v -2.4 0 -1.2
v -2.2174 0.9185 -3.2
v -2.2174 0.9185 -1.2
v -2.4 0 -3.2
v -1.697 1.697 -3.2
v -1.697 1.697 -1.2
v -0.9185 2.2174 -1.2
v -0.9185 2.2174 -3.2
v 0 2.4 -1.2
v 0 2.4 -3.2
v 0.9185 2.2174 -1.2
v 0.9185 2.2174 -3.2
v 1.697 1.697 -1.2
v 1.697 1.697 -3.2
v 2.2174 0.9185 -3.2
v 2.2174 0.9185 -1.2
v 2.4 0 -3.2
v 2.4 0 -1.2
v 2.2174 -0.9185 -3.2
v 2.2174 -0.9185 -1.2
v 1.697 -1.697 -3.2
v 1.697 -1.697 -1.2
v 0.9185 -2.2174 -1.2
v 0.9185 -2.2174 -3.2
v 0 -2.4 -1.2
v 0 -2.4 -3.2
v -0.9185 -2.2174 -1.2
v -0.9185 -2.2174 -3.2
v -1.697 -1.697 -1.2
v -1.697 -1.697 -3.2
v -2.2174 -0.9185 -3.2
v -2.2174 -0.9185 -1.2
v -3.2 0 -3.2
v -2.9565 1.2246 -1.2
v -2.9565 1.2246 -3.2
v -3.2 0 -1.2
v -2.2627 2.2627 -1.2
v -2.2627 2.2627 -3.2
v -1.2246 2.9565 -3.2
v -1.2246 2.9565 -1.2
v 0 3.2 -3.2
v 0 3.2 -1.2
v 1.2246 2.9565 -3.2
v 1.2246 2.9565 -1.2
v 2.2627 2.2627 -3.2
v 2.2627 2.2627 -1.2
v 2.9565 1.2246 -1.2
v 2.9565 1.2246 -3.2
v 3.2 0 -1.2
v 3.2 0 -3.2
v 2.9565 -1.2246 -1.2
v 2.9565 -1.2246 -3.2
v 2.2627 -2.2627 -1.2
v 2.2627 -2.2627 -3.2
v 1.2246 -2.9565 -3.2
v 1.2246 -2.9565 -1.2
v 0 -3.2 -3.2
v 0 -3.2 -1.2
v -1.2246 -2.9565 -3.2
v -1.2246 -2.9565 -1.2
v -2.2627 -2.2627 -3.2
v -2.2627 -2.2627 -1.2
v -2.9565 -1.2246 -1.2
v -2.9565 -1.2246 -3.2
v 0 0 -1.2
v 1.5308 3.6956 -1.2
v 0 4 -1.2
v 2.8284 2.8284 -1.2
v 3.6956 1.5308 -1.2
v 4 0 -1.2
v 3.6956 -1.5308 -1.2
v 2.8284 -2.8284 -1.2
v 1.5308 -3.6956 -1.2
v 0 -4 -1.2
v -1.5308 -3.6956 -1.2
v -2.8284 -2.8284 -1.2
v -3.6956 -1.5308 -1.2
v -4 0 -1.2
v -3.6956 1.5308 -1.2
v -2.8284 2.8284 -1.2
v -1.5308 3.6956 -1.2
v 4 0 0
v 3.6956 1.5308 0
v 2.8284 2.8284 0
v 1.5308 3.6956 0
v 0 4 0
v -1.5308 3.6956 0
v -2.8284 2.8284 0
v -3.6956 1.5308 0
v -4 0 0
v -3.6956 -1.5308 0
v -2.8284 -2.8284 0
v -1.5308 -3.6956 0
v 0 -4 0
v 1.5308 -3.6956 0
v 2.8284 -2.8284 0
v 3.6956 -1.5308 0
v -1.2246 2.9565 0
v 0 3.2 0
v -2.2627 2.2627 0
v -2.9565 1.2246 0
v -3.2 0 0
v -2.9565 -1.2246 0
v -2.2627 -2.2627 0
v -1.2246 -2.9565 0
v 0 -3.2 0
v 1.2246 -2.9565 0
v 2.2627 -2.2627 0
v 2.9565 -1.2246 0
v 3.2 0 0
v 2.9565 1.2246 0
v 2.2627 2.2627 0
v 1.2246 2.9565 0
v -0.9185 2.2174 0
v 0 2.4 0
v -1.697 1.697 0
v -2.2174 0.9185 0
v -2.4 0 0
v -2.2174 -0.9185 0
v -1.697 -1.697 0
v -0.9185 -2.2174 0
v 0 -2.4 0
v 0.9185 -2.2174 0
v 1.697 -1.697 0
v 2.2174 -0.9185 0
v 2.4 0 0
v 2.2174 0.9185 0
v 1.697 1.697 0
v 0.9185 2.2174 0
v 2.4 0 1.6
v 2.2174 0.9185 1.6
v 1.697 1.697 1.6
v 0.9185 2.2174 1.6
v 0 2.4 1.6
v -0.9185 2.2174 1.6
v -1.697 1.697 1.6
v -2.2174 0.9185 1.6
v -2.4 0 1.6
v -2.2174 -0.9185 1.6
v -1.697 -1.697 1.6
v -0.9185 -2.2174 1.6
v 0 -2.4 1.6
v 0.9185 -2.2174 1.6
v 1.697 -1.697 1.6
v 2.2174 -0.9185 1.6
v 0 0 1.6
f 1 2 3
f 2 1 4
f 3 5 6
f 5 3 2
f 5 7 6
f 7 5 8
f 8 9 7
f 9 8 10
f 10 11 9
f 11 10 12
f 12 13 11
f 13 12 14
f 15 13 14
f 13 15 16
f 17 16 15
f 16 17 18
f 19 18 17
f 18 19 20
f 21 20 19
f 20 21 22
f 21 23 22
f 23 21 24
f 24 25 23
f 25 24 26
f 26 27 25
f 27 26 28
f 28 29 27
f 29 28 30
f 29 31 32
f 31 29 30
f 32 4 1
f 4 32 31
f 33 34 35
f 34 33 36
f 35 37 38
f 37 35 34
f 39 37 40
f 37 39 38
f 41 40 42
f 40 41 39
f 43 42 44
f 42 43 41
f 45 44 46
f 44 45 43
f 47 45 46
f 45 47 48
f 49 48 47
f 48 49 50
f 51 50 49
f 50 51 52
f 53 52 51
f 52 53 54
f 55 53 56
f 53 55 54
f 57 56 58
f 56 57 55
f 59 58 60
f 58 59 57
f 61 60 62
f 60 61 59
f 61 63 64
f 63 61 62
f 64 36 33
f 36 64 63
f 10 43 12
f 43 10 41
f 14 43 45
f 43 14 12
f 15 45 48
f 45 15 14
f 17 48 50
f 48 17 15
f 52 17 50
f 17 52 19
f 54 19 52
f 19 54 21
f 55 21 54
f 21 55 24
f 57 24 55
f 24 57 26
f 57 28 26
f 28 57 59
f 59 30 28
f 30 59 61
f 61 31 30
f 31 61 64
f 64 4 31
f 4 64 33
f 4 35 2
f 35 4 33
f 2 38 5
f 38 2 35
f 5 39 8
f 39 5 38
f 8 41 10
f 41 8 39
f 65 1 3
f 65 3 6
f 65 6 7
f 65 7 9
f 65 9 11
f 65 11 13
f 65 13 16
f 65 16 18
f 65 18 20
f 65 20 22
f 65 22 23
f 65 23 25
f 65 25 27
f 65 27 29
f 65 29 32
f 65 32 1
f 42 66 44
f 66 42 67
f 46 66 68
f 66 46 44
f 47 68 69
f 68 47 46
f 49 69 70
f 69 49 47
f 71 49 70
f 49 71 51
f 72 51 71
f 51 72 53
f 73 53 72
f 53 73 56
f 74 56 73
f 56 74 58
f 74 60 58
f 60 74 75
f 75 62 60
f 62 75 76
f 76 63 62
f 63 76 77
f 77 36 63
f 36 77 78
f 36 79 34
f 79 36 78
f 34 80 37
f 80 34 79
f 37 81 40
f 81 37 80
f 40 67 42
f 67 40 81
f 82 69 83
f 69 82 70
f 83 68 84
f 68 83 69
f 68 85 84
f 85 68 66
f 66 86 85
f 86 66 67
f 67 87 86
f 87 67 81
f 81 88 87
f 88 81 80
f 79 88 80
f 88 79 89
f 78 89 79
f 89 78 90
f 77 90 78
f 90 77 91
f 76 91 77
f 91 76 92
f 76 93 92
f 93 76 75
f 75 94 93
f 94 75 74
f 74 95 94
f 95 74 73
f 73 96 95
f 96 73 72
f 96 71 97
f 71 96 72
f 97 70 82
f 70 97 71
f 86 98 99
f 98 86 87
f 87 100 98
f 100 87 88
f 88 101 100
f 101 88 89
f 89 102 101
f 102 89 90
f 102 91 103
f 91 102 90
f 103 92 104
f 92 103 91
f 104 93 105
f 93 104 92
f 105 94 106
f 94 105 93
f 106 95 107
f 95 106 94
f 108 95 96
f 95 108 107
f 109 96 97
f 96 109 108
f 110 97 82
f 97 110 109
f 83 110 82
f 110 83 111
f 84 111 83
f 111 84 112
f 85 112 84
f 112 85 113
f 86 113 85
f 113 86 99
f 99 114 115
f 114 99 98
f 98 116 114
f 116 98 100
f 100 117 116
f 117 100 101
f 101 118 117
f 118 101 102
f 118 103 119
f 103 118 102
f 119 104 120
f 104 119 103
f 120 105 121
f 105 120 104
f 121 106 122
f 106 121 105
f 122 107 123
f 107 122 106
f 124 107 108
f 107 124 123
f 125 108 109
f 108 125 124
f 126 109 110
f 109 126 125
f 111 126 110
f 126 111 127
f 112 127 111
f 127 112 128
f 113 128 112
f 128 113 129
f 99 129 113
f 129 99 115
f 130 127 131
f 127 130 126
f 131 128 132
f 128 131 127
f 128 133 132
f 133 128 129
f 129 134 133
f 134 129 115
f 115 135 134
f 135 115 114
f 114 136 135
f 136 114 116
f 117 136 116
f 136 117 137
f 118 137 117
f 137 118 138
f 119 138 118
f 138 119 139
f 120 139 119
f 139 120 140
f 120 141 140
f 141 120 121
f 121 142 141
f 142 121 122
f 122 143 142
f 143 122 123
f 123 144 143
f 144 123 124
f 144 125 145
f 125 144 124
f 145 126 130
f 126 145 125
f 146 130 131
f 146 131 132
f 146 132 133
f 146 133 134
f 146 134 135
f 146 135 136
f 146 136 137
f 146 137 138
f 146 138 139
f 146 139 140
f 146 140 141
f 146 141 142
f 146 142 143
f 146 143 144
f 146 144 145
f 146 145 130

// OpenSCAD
// file: ../p/4-4edge.scad
use <../lib.scad>
function ldraw_lib__4_4edge() = [
// 0 Circle 1.0
// 0 Name: 4-4edge.dat
// 0 Author: James Jessiman
// 0 !LDRAW_ORG Primitive UPDATE 2017-01
// 0 !LICENSE Licensed under CC BY 2.0 and CC BY 4.0 : see CAreadme.txt
// 
// 0 BFC CERTIFY CCW
  [0,"BFC","CERTIFY"],
  [0,"BFC","CCW"],
// 
// 0 !HISTORY 1998-12-15 [PTadmin] Official Update 1998-10
// 0 !HISTORY 2005-12-28 [PTadmin] Official Update 2005-01
// 0 !HISTORY 2007-06-24 [PTadmin] Header formatted for Contributor Agreement
// 0 !HISTORY 2008-07-01 [PTadmin] Official Update 2008-01
// 0 !HISTORY 2017-01-15 [Steffen] BFCed
// 0 !HISTORY 2017-12-30 [PTadmin] Official Update 2017-01
// 
// 
// 2 24 1 0 0 0.9239 0 0.3827
  [2,24,1,0,0,0.9239,0,0.3827],
// 2 24 0.9239 0 0.3827 0.7071 0 0.7071
  [2,24,0.9239,0,0.3827,0.7071,0,0.7071],
// 2 24 0.7071 0 0.7071 0.3827 0 0.9239
  [2,24,0.7071,0,0.7071,0.3827,0,0.9239],
// 2 24 0.3827 0 0.9239 0 0 1
  [2,24,0.3827,0,0.9239,0,0,1],
// 2 24 0 0 1 -0.3827 0 0.9239
  [2,24,0,0,1,-0.3827,0,0.9239],
// 2 24 -0.3827 0 0.9239 -0.7071 0 0.7071
  [2,24,-0.3827,0,0.9239,-0.7071,0,0.7071],
// 2 24 -0.7071 0 0.7071 -0.9239 0 0.3827
  [2,24,-0.7071,0,0.7071,-0.9239,0,0.3827],
// 2 24 -0.9239 0 0.3827 -1 0 -0
  [2,24,-0.9239,0,0.3827,-1,0,-0],
// 2 24 -1 0 -0 -0.9239 0 -0.3827
  [2,24,-1,0,-0,-0.9239,0,-0.3827],
// 2 24 -0.9239 0 -0.3827 -0.7071 0 -0.7071
  [2,24,-0.9239,0,-0.3827,-0.7071,0,-0.7071],
// 2 24 -0.7071 0 -0.7071 -0.3827 0 -0.9239
  [2,24,-0.7071,0,-0.7071,-0.3827,0,-0.9239],
// 2 24 -0.3827 0 -0.9239 0 0 -1
  [2,24,-0.3827,0,-0.9239,0,0,-1],
// 2 24 0 0 -1 0.3827 0 -0.9239
  [2,24,0,0,-1,0.3827,0,-0.9239],
// 2 24 0.3827 0 -0.9239 0.7071 0 -0.7071
  [2,24,0.3827,0,-0.9239,0.7071,0,-0.7071],
// 2 24 0.7071 0 -0.7071 0.9239 0 -0.3827
  [2,24,0.7071,0,-0.7071,0.9239,0,-0.3827],
// 2 24 0.9239 0 -0.3827 1 0 0
  [2,24,0.9239,0,-0.3827,1,0,0],
];
module ldraw_lib__4_4edge(step=0, col=false, unit=2/5, alt=false, line=0.2, solid=!$preview)
    makepoly(ldraw_lib__4_4edge(), step=step, col=col, unit=unit, alt=alt, line=line, solid=solid);
ldraw_lib__4_4edge(line=0.2);
// file: ../p/4-4cyli.scad
use <../lib.scad>
function ldraw_lib__4_4cyli() = [
// 0 Cylinder 1.0
// 0 Name: 4-4cyli.dat
// 0 Author: James Jessiman
// 0 !LDRAW_ORG Primitive UPDATE 2005-01
// 0 !LICENSE Licensed under CC BY 2.0 and CC BY 4.0 : see CAreadme.txt
// 
// 0 BFC CERTIFY CCW
  [0,"BFC","CERTIFY"],
  [0,"BFC","CCW"],
// 
// 0 !HISTORY 1998-12-15 [PTadmin] Official Update 1998-10
// 0 !HISTORY 2002-03-23 [sbliss] Added BFC statement; merged headers from files in distributions LDraw 0.27 and Complete.
// 0 !HISTORY 2002-04-25 [PTadmin] Official Update 2002-02
// 0 !HISTORY 2004-12-14 [guyvivan] BFC CCW
// 0 !HISTORY 2005-12-28 [PTadmin] Official Update 2005-01
// 0 !HISTORY 2007-06-24 [PTadmin] Header formatted for Contributor Agreement
// 0 !HISTORY 2008-07-01 [PTadmin] Official Update 2008-01
// 
// 
// 4 16 1 1 0 0.9239 1 0.3827 0.9239 0 0.3827 1 0 0
  [4,16,1,1,0,0.9239,1,0.3827,0.9239,0,0.3827,1,0,0],
// 5 24 1 0 0 1 1 0 0.9239 0 0.3827 0.9239 0 -0.3827
  [5,24,1,0,0,1,1,0,0.9239,0,0.3827,0.9239,0,-0.3827],
// 4 16 0.9239 1 0.3827 0.7071 1 0.7071 0.7071 0 0.7071 0.9239 0 0.3827
  [4,16,0.9239,1,0.3827,0.7071,1,0.7071,0.7071,0,0.7071,0.9239,0,0.3827],
// 5 24 0.9239 0 0.3827 0.9239 1 0.3827 0.7071 0 0.7071 1 0 0
  [5,24,0.9239,0,0.3827,0.9239,1,0.3827,0.7071,0,0.7071,1,0,0],
// 4 16 0.7071 1 0.7071 0.3827 1 0.9239 0.3827 0 0.9239 0.7071 0 0.7071
  [4,16,0.7071,1,0.7071,0.3827,1,0.9239,0.3827,0,0.9239,0.7071,0,0.7071],
// 5 24 0.7071 0 0.7071 0.7071 1 0.7071 0.3827 0 0.9239 0.9239 0 0.3827
  [5,24,0.7071,0,0.7071,0.7071,1,0.7071,0.3827,0,0.9239,0.9239,0,0.3827],
// 4 16 0.3827 1 0.9239 0 1 1 0 0 1 0.3827 0 0.9239
  [4,16,0.3827,1,0.9239,0,1,1,0,0,1,0.3827,0,0.9239],
// 5 24 0.3827 0 0.9239 0.3827 1 0.9239 0 0 1 0.7071 0 0.7071
  [5,24,0.3827,0,0.9239,0.3827,1,0.9239,0,0,1,0.7071,0,0.7071],
// 4 16 0 1 1 -0.3827 1 0.9239 -0.3827 0 0.9239 0 0 1
  [4,16,0,1,1,-0.3827,1,0.9239,-0.3827,0,0.9239,0,0,1],
// 5 24 0 0 1 0 1 1 -0.3827 0 0.9239 0.3827 0 0.9239
  [5,24,0,0,1,0,1,1,-0.3827,0,0.9239,0.3827,0,0.9239],
// 4 16 -0.3827 1 0.9239 -0.7071 1 0.7071 -0.7071 0 0.7071 -0.3827 0 0.9239
  [4,16,-0.3827,1,0.9239,-0.7071,1,0.7071,-0.7071,0,0.7071,-0.3827,0,0.9239],
// 5 24 -0.3827 0 0.9239 -0.3827 1 0.9239 -0.7071 0 0.7071 0 0 1
  [5,24,-0.3827,0,0.9239,-0.3827,1,0.9239,-0.7071,0,0.7071,0,0,1],
// 4 16 -0.7071 1 0.7071 -0.9239 1 0.3827 -0.9239 0 0.3827 -0.7071 0 0.7071
  [4,16,-0.7071,1,0.7071,-0.9239,1,0.3827,-0.9239,0,0.3827,-0.7071,0,0.7071],
// 5 24 -0.7071 0 0.7071 -0.7071 1 0.7071 -0.9239 0 0.3827 -0.3827 0 0.9239
  [5,24,-0.7071,0,0.7071,-0.7071,1,0.7071,-0.9239,0,0.3827,-0.3827,0,0.9239],
// 4 16 -0.9239 1 0.3827 -1 1 0 -1 0 0 -0.9239 0 0.3827
  [4,16,-0.9239,1,0.3827,-1,1,0,-1,0,0,-0.9239,0,0.3827],
// 5 24 -0.9239 0 0.3827 -0.9239 1 0.3827 -1 0 0 -0.7071 0 0.7071
  [5,24,-0.9239,0,0.3827,-0.9239,1,0.3827,-1,0,0,-0.7071,0,0.7071],
// 4 16 -1 1 0 -0.9239 1 -0.3827 -0.9239 0 -0.3827 -1 0 0
  [4,16,-1,1,0,-0.9239,1,-0.3827,-0.9239,0,-0.3827,-1,0,0],
// 5 24 -1 0 0 -1 1 0 -0.9239 0 -0.3827 -0.9239 0 0.3827
  [5,24,-1,0,0,-1,1,0,-0.9239,0,-0.3827,-0.9239,0,0.3827],
// 4 16 -0.9239 1 -0.3827 -0.7071 1 -0.7071 -0.7071 0 -0.7071 -0.9239 0 -0.3827
  [4,16,-0.9239,1,-0.3827,-0.7071,1,-0.7071,-0.7071,0,-0.7071,-0.9239,0,-0.3827],
// 5 24 -0.9239 0 -0.3827 -0.9239 1 -0.3827 -0.7071 0 -0.7071 -1 0 0
  [5,24,-0.9239,0,-0.3827,-0.9239,1,-0.3827,-0.7071,0,-0.7071,-1,0,0],
// 4 16 -0.7071 1 -0.7071 -0.3827 1 -0.9239 -0.3827 0 -0.9239 -0.7071 0 -0.7071
  [4,16,-0.7071,1,-0.7071,-0.3827,1,-0.9239,-0.3827,0,-0.9239,-0.7071,0,-0.7071],
// 5 24 -0.7071 0 -0.7071 -0.7071 1 -0.7071 -0.3827 0 -0.9239 -0.9239 0 -0.3827
  [5,24,-0.7071,0,-0.7071,-0.7071,1,-0.7071,-0.3827,0,-0.9239,-0.9239,0,-0.3827],
// 4 16 -0.3827 1 -0.9239 0 1 -1 0 0 -1 -0.3827 0 -0.9239
  [4,16,-0.3827,1,-0.9239,0,1,-1,0,0,-1,-0.3827,0,-0.9239],
// 5 24 -0.3827 0 -0.9239 -0.3827 1 -0.9239 0 0 -1 -0.7071 0 -0.7071
  [5,24,-0.3827,0,-0.9239,-0.3827,1,-0.9239,0,0,-1,-0.7071,0,-0.7071],
// 4 16 0 1 -1 0.3827 1 -0.9239 0.3827 0 -0.9239 0 0 -1
  [4,16,0,1,-1,0.3827,1,-0.9239,0.3827,0,-0.9239,0,0,-1],
// 5 24 0 0 -1 0 1 -1 0.3827 0 -0.9239 -0.3827 0 -0.9239
  [5,24,0,0,-1,0,1,-1,0.3827,0,-0.9239,-0.3827,0,-0.9239],
// 4 16 0.3827 1 -0.9239 0.7071 1 -0.7071 0.7071 0 -0.7071 0.3827 0 -0.9239
  [4,16,0.3827,1,-0.9239,0.7071,1,-0.7071,0.7071,0,-0.7071,0.3827,0,-0.9239],
// 5 24 0.3827 0 -0.9239 0.3827 1 -0.9239 0.7071 0 -0.7071 0 0 -1
  [5,24,0.3827,0,-0.9239,0.3827,1,-0.9239,0.7071,0,-0.7071,0,0,-1],
// 4 16 0.7071 1 -0.7071 0.9239 1 -0.3827 0.9239 0 -0.3827 0.7071 0 -0.7071
  [4,16,0.7071,1,-0.7071,0.9239,1,-0.3827,0.9239,0,-0.3827,0.7071,0,-0.7071],
// 5 24 0.7071 0 -0.7071 0.7071 1 -0.7071 0.9239 0 -0.3827 0.3827 0 -0.9239
  [5,24,0.7071,0,-0.7071,0.7071,1,-0.7071,0.9239,0,-0.3827,0.3827,0,-0.9239],
// 4 16 0.9239 1 -0.3827 1 1 0 1 0 0 0.9239 0 -0.3827
  [4,16,0.9239,1,-0.3827,1,1,0,1,0,0,0.9239,0,-0.3827],
// 5 24 0.9239 0 -0.3827 0.9239 1 -0.3827 1 0 0 0.7071 0 -0.7071
  [5,24,0.9239,0,-0.3827,0.9239,1,-0.3827,1,0,0,0.7071,0,-0.7071],
// 0
];
module ldraw_lib__4_4cyli(step=0, col=false, unit=2/5, alt=false, line=0.2, solid=!$preview)
    makepoly(ldraw_lib__4_4cyli(), step=step, col=col, unit=unit, alt=alt, line=line, solid=solid);
ldraw_lib__4_4cyli(line=0.2);
// file: ../p/stud4.scad
use <../lib.scad>
use <4-4cyli.scad>
use <4-4edge.scad>
use <4-4ring3.scad>
function ldraw_lib__stud4() = [
// 0 Stud Tube Open
// 0 Name: stud4.dat
// 0 Author: James Jessiman
// 0 !LDRAW_ORG Primitive UPDATE 2009-02
// 0 !LICENSE Licensed under CC BY 2.0 and CC BY 4.0 : see CAreadme.txt
// 
// 0 BFC CERTIFY CCW
  [0,"BFC","CERTIFY"],
  [0,"BFC","CCW"],
// 
// 0 !HISTORY 1999-07-05 [PTadmin] Official Update 1999-05
// 0 !HISTORY 2002-04-04 [sbliss] Modified for BFC compliance
// 0 !HISTORY 2002-04-25 [PTadmin] Official Update 2002-02
// 0 !HISTORY 2007-06-24 [PTadmin] Header formatted for Contributor Agreement
// 0 !HISTORY 2008-07-01 [PTadmin] Official Update 2008-01
// 0 !HISTORY 2009-06-21 [cwdee] Update ring references to 4-4ring
// 0 !HISTORY 2009-09-03 [PTadmin] Official Update 2009-02
// 
// 
// 1 16 0 -4 0 6 0 0 0 1 0 0 0 6 4-4edge.dat
  [1,16,0,-4,0,6,0,0,0,1,0,0,0,6, ldraw_lib__4_4edge()],
// 1 16 0 -4 0 8 0 0 0 1 0 0 0 8 4-4edge.dat
  [1,16,0,-4,0,8,0,0,0,1,0,0,0,8, ldraw_lib__4_4edge()],
// 1 16 0 0 0 6 0 0 0 1 0 0 0 6 4-4edge.dat
  [1,16,0,0,0,6,0,0,0,1,0,0,0,6, ldraw_lib__4_4edge()],
// 1 16 0 0 0 8 0 0 0 1 0 0 0 8 4-4edge.dat
  [1,16,0,0,0,8,0,0,0,1,0,0,0,8, ldraw_lib__4_4edge()],
// 0 BFC INVERTNEXT
  [0,"BFC","INVERTNEXT"],
// 1 16 0 -4 0 6 0 0 0 4 0 0 0 6 4-4cyli.dat
  [1,16,0,-4,0,6,0,0,0,4,0,0,0,6, ldraw_lib__4_4cyli()],
// 1 16 0 -4 0 8 0 0 0 4 0 0 0 8 4-4cyli.dat
  [1,16,0,-4,0,8,0,0,0,4,0,0,0,8, ldraw_lib__4_4cyli()],
// 1 16 0 -4 0 2 0 0 0 1 0 0 0 2 4-4ring3.dat
  [1,16,0,-4,0,2,0,0,0,1,0,0,0,2, ldraw_lib__4_4ring3()],
// 0
];
module ldraw_lib__stud4(step=0, col=false, unit=2/5, alt=false, line=0.2, solid=!$preview)
    makepoly(ldraw_lib__stud4(), step=step, col=col, unit=unit, alt=alt, line=line, solid=solid);
ldraw_lib__stud4(line=0.2);
// file: ../p/stud.scad
use <../lib.scad>
use <4-4cyli.scad>
use <4-4disc.scad>
use <4-4edge.scad>
function ldraw_lib__stud() = [
// 0 Stud
// 0 Name: stud.dat
// 0 Author: James Jessiman
// 0 !LDRAW_ORG Primitive UPDATE 2012-01
// 0 !LICENSE Licensed under CC BY 2.0 and CC BY 4.0 : see CAreadme.txt
// 
// 0 BFC CERTIFY CCW
  [0,"BFC","CERTIFY"],
  [0,"BFC","CCW"],
// 
// 0 !HISTORY 2002-04-04 [sbliss] Modified for BFC compliance
// 0 !HISTORY 2002-04-25 [PTadmin] Official Update 2002-02
// 0 !HISTORY 2007-06-24 [PTadmin] Header formatted for Contributor Agreement
// 0 !HISTORY 2008-07-01 [PTadmin] Official Update 2008-01
// 0 !HISTORY 2012-02-16 [Philo] Changed to CCW
// 0 !HISTORY 2012-03-30 [PTadmin] Official Update 2012-01
// 
// 
// 1 16 0 0 0 6 0 0 0 1 0 0 0 6 4-4edge.dat
  [1,16,0,0,0,6,0,0,0,1,0,0,0,6, ldraw_lib__4_4edge()],
// 1 16 0 -4 0 6 0 0 0 1 0 0 0 6 4-4edge.dat
  [1,16,0,-4,0,6,0,0,0,1,0,0,0,6, ldraw_lib__4_4edge()],
// 1 16 0 0 0 6 0 0 0 -4 0 0 0 6 4-4cyli.dat
  [1,16,0,0,0,6,0,0,0,-4,0,0,0,6, ldraw_lib__4_4cyli()],
// 1 16 0 -4 0 6 0 0 0 1 0 0 0 6 4-4disc.dat
  [1,16,0,-4,0,6,0,0,0,1,0,0,0,6, ldraw_lib__4_4disc()],
];
module ldraw_lib__stud(step=0, col=false, unit=2/5, alt=false, line=0.2, solid=!$preview)
    makepoly(ldraw_lib__stud(), step=step, col=col, unit=unit, alt=alt, line=line, solid=solid);
ldraw_lib__stud(line=0.2);
// file: ../p/4-4ring4.scad
use <../lib.scad>
function ldraw_lib__4_4ring4() = [
// 0 Ring  4 x 1.0
// 0 Name: 4-4ring4.dat
// 0 Author: James Jessiman
// 0 !LDRAW_ORG Primitive UPDATE 2009-01
// 0 !LICENSE Licensed under CC BY 2.0 and CC BY 4.0 : see CAreadme.txt
// 
// 0 BFC CERTIFY CCW
  [0,"BFC","CERTIFY"],
  [0,"BFC","CCW"],
// 
// 0 !HISTORY 1998-12-15 [PTadmin] Official Update 1998-10
// 0 !HISTORY 2002-04-08 [BrickCaster] Modified for BFC compliance
// 0 !HISTORY 2002-04-25 [PTadmin] Official Update 2002-02
// 0 !HISTORY 2007-06-24 [PTadmin] Header formatted for Contributor Agreement
// 0 !HISTORY 2008-07-01 [PTadmin] Official Update 2008-01
// 0 !HISTORY 2008-08-26 [cwdee] Switch polygon winding and rename
// 0 !HISTORY 2009-05-02 [PTadmin] Official Update 2009-01
// 
// 
// 4 16 -1.9135 0 4.6195 -1.5308 0 3.6956 0 0 4 0 0 5
  [4,16,-1.9135,0,4.6195,-1.5308,0,3.6956,0,0,4,0,0,5],
// 4 16 -3.5355 0 3.5355 -2.8284 0 2.8284 -1.5308 0 3.6956 -1.9135 0 4.6195
  [4,16,-3.5355,0,3.5355,-2.8284,0,2.8284,-1.5308,0,3.6956,-1.9135,0,4.6195],
// 4 16 -4.6195 0 1.9135 -3.6956 0 1.5308 -2.8284 0 2.8284 -3.5355 0 3.5355
  [4,16,-4.6195,0,1.9135,-3.6956,0,1.5308,-2.8284,0,2.8284,-3.5355,0,3.5355],
// 4 16 -5 0 0 -4 0 0 -3.6956 0 1.5308 -4.6195 0 1.9135
  [4,16,-5,0,0,-4,0,0,-3.6956,0,1.5308,-4.6195,0,1.9135],
// 4 16 -4.6195 0 -1.9135 -3.6956 0 -1.5308 -4 0 0 -5 0 0
  [4,16,-4.6195,0,-1.9135,-3.6956,0,-1.5308,-4,0,0,-5,0,0],
// 4 16 -3.5355 0 -3.5355 -2.8284 0 -2.8284 -3.6956 0 -1.5308 -4.6195 0 -1.9135
  [4,16,-3.5355,0,-3.5355,-2.8284,0,-2.8284,-3.6956,0,-1.5308,-4.6195,0,-1.9135],
// 4 16 -1.9135 0 -4.6195 -1.5308 0 -3.6956 -2.8284 0 -2.8284 -3.5355 0 -3.5355
  [4,16,-1.9135,0,-4.6195,-1.5308,0,-3.6956,-2.8284,0,-2.8284,-3.5355,0,-3.5355],
// 4 16 0 0 -5 0 0 -4 -1.5308 0 -3.6956 -1.9135 0 -4.6195
  [4,16,0,0,-5,0,0,-4,-1.5308,0,-3.6956,-1.9135,0,-4.6195],
// 4 16 1.9135 0 -4.6195 1.5308 0 -3.6956 0 0 -4 0 0 -5
  [4,16,1.9135,0,-4.6195,1.5308,0,-3.6956,0,0,-4,0,0,-5],
// 4 16 3.5355 0 -3.5355 2.8284 0 -2.8284 1.5308 0 -3.6956 1.9135 0 -4.6195
  [4,16,3.5355,0,-3.5355,2.8284,0,-2.8284,1.5308,0,-3.6956,1.9135,0,-4.6195],
// 4 16 4.6195 0 -1.9135 3.6956 0 -1.5308 2.8284 0 -2.8284 3.5355 0 -3.5355
  [4,16,4.6195,0,-1.9135,3.6956,0,-1.5308,2.8284,0,-2.8284,3.5355,0,-3.5355],
// 4 16 5 0 0 4 0 0 3.6956 0 -1.5308 4.6195 0 -1.9135
  [4,16,5,0,0,4,0,0,3.6956,0,-1.5308,4.6195,0,-1.9135],
// 4 16 4.6195 0 1.9135 3.6956 0 1.5308 4 0 0 5 0 0
  [4,16,4.6195,0,1.9135,3.6956,0,1.5308,4,0,0,5,0,0],
// 4 16 3.5355 0 3.5355 2.8284 0 2.8284 3.6956 0 1.5308 4.6195 0 1.9135
  [4,16,3.5355,0,3.5355,2.8284,0,2.8284,3.6956,0,1.5308,4.6195,0,1.9135],
// 4 16 1.9135 0 4.6195 1.5308 0 3.6956 2.8284 0 2.8284 3.5355 0 3.5355
  [4,16,1.9135,0,4.6195,1.5308,0,3.6956,2.8284,0,2.8284,3.5355,0,3.5355],
// 4 16 0 0 5 0 0 4 1.5308 0 3.6956 1.9135 0 4.6195
  [4,16,0,0,5,0,0,4,1.5308,0,3.6956,1.9135,0,4.6195],
// 0
];
module ldraw_lib__4_4ring4(step=0, col=false, unit=2/5, alt=false, line=0.2, solid=!$preview)
    makepoly(ldraw_lib__4_4ring4(), step=step, col=col, unit=unit, alt=alt, line=line, solid=solid);
ldraw_lib__4_4ring4(line=0.2);
// file: ../p/4-4ring3.scad
use <../lib.scad>
function ldraw_lib__4_4ring3() = [
// 0 Ring  3 x 1.0
// 0 Name: 4-4ring3.dat
// 0 Author: James Jessiman
// 0 !LDRAW_ORG Primitive UPDATE 2009-01
// 0 !LICENSE Licensed under CC BY 2.0 and CC BY 4.0 : see CAreadme.txt
// 
// 0 BFC CERTIFY CCW
  [0,"BFC","CERTIFY"],
  [0,"BFC","CCW"],
// 
// 0 !HISTORY 1998-12-15 [PTadmin] Official Update 1998-10
// 0 !HISTORY 2002-04-05 [hafhead] Added BFC statement
// 0 !HISTORY 2002-04-25 [PTadmin] Official Update 2002-02
// 0 !HISTORY 2007-06-24 [PTadmin] Header formatted for Contributor Agreement
// 0 !HISTORY 2008-07-01 [PTadmin] Official Update 2008-01
// 0 !HISTORY 2008-08-26 [cwdee] Switch polygon winding and rename
// 0 !HISTORY 2009-05-02 [PTadmin] Official Update 2009-01
// 
// 
// 4 16 -1.5308 0 3.6956 -1.1481 0 2.7717 0 0 3 0 0 4
  [4,16,-1.5308,0,3.6956,-1.1481,0,2.7717,0,0,3,0,0,4],
// 4 16 -2.8284 0 2.8284 -2.1213 0 2.1213 -1.1481 0 2.7717 -1.5308 0 3.6956
  [4,16,-2.8284,0,2.8284,-2.1213,0,2.1213,-1.1481,0,2.7717,-1.5308,0,3.6956],
// 4 16 -3.6956 0 1.5308 -2.7717 0 1.1481 -2.1213 0 2.1213 -2.8284 0 2.8284
  [4,16,-3.6956,0,1.5308,-2.7717,0,1.1481,-2.1213,0,2.1213,-2.8284,0,2.8284],
// 4 16 -4 0 0 -3 0 0 -2.7717 0 1.1481 -3.6956 0 1.5308
  [4,16,-4,0,0,-3,0,0,-2.7717,0,1.1481,-3.6956,0,1.5308],
// 4 16 -3.6956 0 -1.5308 -2.7717 0 -1.1481 -3 0 0 -4 0 0
  [4,16,-3.6956,0,-1.5308,-2.7717,0,-1.1481,-3,0,0,-4,0,0],
// 4 16 -2.8284 0 -2.8284 -2.1213 0 -2.1213 -2.7717 0 -1.1481 -3.6956 0 -1.5308
  [4,16,-2.8284,0,-2.8284,-2.1213,0,-2.1213,-2.7717,0,-1.1481,-3.6956,0,-1.5308],
// 4 16 -1.5308 0 -3.6956 -1.1481 0 -2.7717 -2.1213 0 -2.1213 -2.8284 0 -2.8284
  [4,16,-1.5308,0,-3.6956,-1.1481,0,-2.7717,-2.1213,0,-2.1213,-2.8284,0,-2.8284],
// 4 16 0 0 -4 0 0 -3 -1.1481 0 -2.7717 -1.5308 0 -3.6956
  [4,16,0,0,-4,0,0,-3,-1.1481,0,-2.7717,-1.5308,0,-3.6956],
// 4 16 1.5308 0 -3.6956 1.1481 0 -2.7717 0 0 -3 0 0 -4
  [4,16,1.5308,0,-3.6956,1.1481,0,-2.7717,0,0,-3,0,0,-4],
// 4 16 2.8284 0 -2.8284 2.1213 0 -2.1213 1.1481 0 -2.7717 1.5308 0 -3.6956
  [4,16,2.8284,0,-2.8284,2.1213,0,-2.1213,1.1481,0,-2.7717,1.5308,0,-3.6956],
// 4 16 3.6956 0 -1.5308 2.7717 0 -1.1481 2.1213 0 -2.1213 2.8284 0 -2.8284
  [4,16,3.6956,0,-1.5308,2.7717,0,-1.1481,2.1213,0,-2.1213,2.8284,0,-2.8284],
// 4 16 4 0 0 3 0 0 2.7717 0 -1.1481 3.6956 0 -1.5308
  [4,16,4,0,0,3,0,0,2.7717,0,-1.1481,3.6956,0,-1.5308],
// 4 16 3.6956 0 1.5308 2.7717 0 1.1481 3 0 0 4 0 0
  [4,16,3.6956,0,1.5308,2.7717,0,1.1481,3,0,0,4,0,0],
// 4 16 2.8284 0 2.8284 2.1213 0 2.1213 2.7717 0 1.1481 3.6956 0 1.5308
  [4,16,2.8284,0,2.8284,2.1213,0,2.1213,2.7717,0,1.1481,3.6956,0,1.5308],
// 4 16 1.5308 0 3.6956 1.1481 0 2.7717 2.1213 0 2.1213 2.8284 0 2.8284
  [4,16,1.5308,0,3.6956,1.1481,0,2.7717,2.1213,0,2.1213,2.8284,0,2.8284],
// 4 16 0 0 4 0 0 3 1.1481 0 2.7717 1.5308 0 3.6956
  [4,16,0,0,4,0,0,3,1.1481,0,2.7717,1.5308,0,3.6956],
// 0
];
module ldraw_lib__4_4ring3(step=0, col=false, unit=2/5, alt=false, line=0.2, solid=!$preview)
    makepoly(ldraw_lib__4_4ring3(), step=step, col=col, unit=unit, alt=alt, line=line, solid=solid);
ldraw_lib__4_4ring3(line=0.2);
// file: ../p/4-4disc.scad
use <../lib.scad>
function ldraw_lib__4_4disc() = [
// 0 Disc 1.0
// 0 Name: 4-4disc.dat
// 0 Author: James Jessiman
// 0 !LDRAW_ORG Primitive UPDATE 2002-02
// 0 !LICENSE Licensed under CC BY 2.0 and CC BY 4.0 : see CAreadme.txt
// 
// 0 BFC CERTIFY CCW
  [0,"BFC","CERTIFY"],
  [0,"BFC","CCW"],
// 
// 0 !HISTORY 1998-12-15 [PTadmin] Official Update 1998-10
// 0 !HISTORY 2002-03-23 [sbliss] Added BFC statement
// 0 !HISTORY 2002-04-25 [PTadmin] Official Update 2002-02
// 0 !HISTORY 2007-06-24 [PTadmin] Header formatted for Contributor Agreement
// 0 !HISTORY 2008-07-01 [PTadmin] Official Update 2008-01
// 
// 
// 3 16 0 0 0 1 0 0 0.9239 0 0.3827
  [3,16,0,0,0,1,0,0,0.9239,0,0.3827],
// 3 16 0 0 0 0.9239 0 0.3827 0.7071 0 0.7071
  [3,16,0,0,0,0.9239,0,0.3827,0.7071,0,0.7071],
// 3 16 0 0 0 0.7071 0 0.7071 0.3827 0 0.9239
  [3,16,0,0,0,0.7071,0,0.7071,0.3827,0,0.9239],
// 3 16 0 0 0 0.3827 0 0.9239 0 0 1
  [3,16,0,0,0,0.3827,0,0.9239,0,0,1],
// 3 16 0 0 0 0 0 1 -0.3827 0 0.9239
  [3,16,0,0,0,0,0,1,-0.3827,0,0.9239],
// 3 16 0 0 0 -0.3827 0 0.9239 -0.7071 0 0.7071
  [3,16,0,0,0,-0.3827,0,0.9239,-0.7071,0,0.7071],
// 3 16 0 0 0 -0.7071 0 0.7071 -0.9239 0 0.3827
  [3,16,0,0,0,-0.7071,0,0.7071,-0.9239,0,0.3827],
// 3 16 0 0 0 -0.9239 0 0.3827 -1 0 -0
  [3,16,0,0,0,-0.9239,0,0.3827,-1,0,-0],
// 3 16 0 0 0 -1 0 -0 -0.9239 0 -0.3827
  [3,16,0,0,0,-1,0,-0,-0.9239,0,-0.3827],
// 3 16 0 0 0 -0.9239 0 -0.3827 -0.7071 0 -0.7071
  [3,16,0,0,0,-0.9239,0,-0.3827,-0.7071,0,-0.7071],
// 3 16 0 0 0 -0.7071 0 -0.7071 -0.3827 0 -0.9239
  [3,16,0,0,0,-0.7071,0,-0.7071,-0.3827,0,-0.9239],
// 3 16 0 0 0 -0.3827 0 -0.9239 0 0 -1
  [3,16,0,0,0,-0.3827,0,-0.9239,0,0,-1],
// 3 16 0 0 0 0 0 -1 0.3827 0 -0.9239
  [3,16,0,0,0,0,0,-1,0.3827,0,-0.9239],
// 3 16 0 0 0 0.3827 0 -0.9239 0.7071 0 -0.7071
  [3,16,0,0,0,0.3827,0,-0.9239,0.7071,0,-0.7071],
// 3 16 0 0 0 0.7071 0 -0.7071 0.9239 0 -0.3827
  [3,16,0,0,0,0.7071,0,-0.7071,0.9239,0,-0.3827],
// 3 16 0 0 0 0.9239 0 -0.3827 1 0 0
  [3,16,0,0,0,0.9239,0,-0.3827,1,0,0],
// 0
];
module ldraw_lib__4_4disc(step=0, col=false, unit=2/5, alt=false, line=0.2, solid=!$preview)
    makepoly(ldraw_lib__4_4disc(), step=step, col=col, unit=unit, alt=alt, line=line, solid=solid);
ldraw_lib__4_4disc(line=0.2);
// file: ../p/4-4cylo.scad
use <../lib.scad>
use <4-4cyli.scad>
use <4-4edge.scad>
function ldraw_lib__4_4cylo() = [
// 0 Cylinder Open 1.0
// 0 Name: 4-4cylo.dat
// 0 Author: Mark Kennedy [mkennedy]
// 0 !LDRAW_ORG Primitive UPDATE 2010-01
// 0 !LICENSE Licensed under CC BY 2.0 and CC BY 4.0 : see CAreadme.txt
// 
// 0 BFC CERTIFY CCW
  [0,"BFC","CERTIFY"],
  [0,"BFC","CCW"],
// 
// 0 !HISTORY 2010-04-05 [PTadmin] Official Update 2010-01
// 
// 
// 1 16 0 0 0 1 0 0 0 1 0 0 0 1 4-4edge.dat
  [1,16,0,0,0,1,0,0,0,1,0,0,0,1, ldraw_lib__4_4edge()],
// 1 16 0 1 0 1 0 0 0 1 0 0 0 1 4-4edge.dat
  [1,16,0,1,0,1,0,0,0,1,0,0,0,1, ldraw_lib__4_4edge()],
// 1 16 0 0 0 1 0 0 0 1 0 0 0 1 4-4cyli.dat
  [1,16,0,0,0,1,0,0,0,1,0,0,0,1, ldraw_lib__4_4cyli()],
// 0
];
module ldraw_lib__4_4cylo(step=0, col=false, unit=2/5, alt=false, line=0.2, solid=!$preview)
    makepoly(ldraw_lib__4_4cylo(), step=step, col=col, unit=unit, alt=alt, line=line, solid=solid);
ldraw_lib__4_4cylo(line=0.2);
// main file
use <../lib.scad>
use <../p/4-4cylo.scad>
use <../p/4-4disc.scad>
use <../p/4-4ring3.scad>
use <../p/4-4ring4.scad>
use <../p/stud.scad>
use <../p/stud4.scad>
function ldraw_lib__6141() = [
// 0 Plate  1 x  1 Round
// 0 Name: 6141.dat
// 0 Author: James Jessiman
// 0 !LDRAW_ORG Part UPDATE 2015-01
// 0 !LICENSE Licensed under CC BY 2.0 and CC BY 4.0 : see CAreadme.txt
// 
// 0 BFC CERTIFY CCW
  [0,"BFC","CERTIFY"],
  [0,"BFC","CCW"],
// 
// 0 !HISTORY 1998-06-20 [PTadmin] Official Update 1998-06
// 0 !HISTORY 2003-01-29 [sbliss] Completed header; BFC'ed; misc cleanup
// 0 !HISTORY 2003-08-01 [PTadmin] Official Update 2003-02
// 0 !HISTORY 2007-10-26 [PTadmin] Header formatted for Contributor Agreement
// 0 !HISTORY 2008-07-01 [PTadmin] Official Update 2008-01
// 0 !HISTORY 2014-11-29 [Steffen] Renamed from 4073
// 0 !HISTORY 2014-12-28 [MagFors] Primitive substitution
// 0 !HISTORY 2015-10-11 [PTadmin] Official Update 2015-01
// 
// 
// 1 16 0 3 0 -1 0 0 0 -1.25 0 0 0 1 stud4.dat
  [1,16,0,3,0,-1,0,0,0,-1.25,0,0,0,1, ldraw_lib__stud4()],
// 1 16 0 3 0 -6 0 0 0 -1 0 0 0 6 4-4disc.dat
  [1,16,0,3,0,-6,0,0,0,-1,0,0,0,6, ldraw_lib__4_4disc()],
// 1 16 0 3 0 -2 0 0 0 -1 0 0 0 2 4-4ring4.dat
  [1,16,0,3,0,-2,0,0,0,-1,0,0,0,2, ldraw_lib__4_4ring4()],
// 1 16 0 0 0 10 0 0 0 3 0 0 0 10 4-4cylo.dat
  [1,16,0,0,0,10,0,0,0,3,0,0,0,10, ldraw_lib__4_4cylo()],
// 1 16 0 0 0 2 0 0 0 1 0 0 0 2 4-4ring4.dat
  [1,16,0,0,0,2,0,0,0,1,0,0,0,2, ldraw_lib__4_4ring4()],
// 1 16 0 0 0 2 0 0 0 1 0 0 0 2 4-4ring3.dat
  [1,16,0,0,0,2,0,0,0,1,0,0,0,2, ldraw_lib__4_4ring3()],
// 1 16 0 0 0 1 0 0 0 1 0 0 0 1 stud.dat
  [1,16,0,0,0,1,0,0,0,1,0,0,0,1, ldraw_lib__stud()],
];
module ldraw_lib__6141(step=0, col=false, unit=2/5, alt=false, line=0.2, solid=!$preview)
    makepoly(ldraw_lib__6141(), step=step, col=col, unit=unit, alt=alt, line=line, solid=solid);
ldraw_lib__6141(line=0.2);
